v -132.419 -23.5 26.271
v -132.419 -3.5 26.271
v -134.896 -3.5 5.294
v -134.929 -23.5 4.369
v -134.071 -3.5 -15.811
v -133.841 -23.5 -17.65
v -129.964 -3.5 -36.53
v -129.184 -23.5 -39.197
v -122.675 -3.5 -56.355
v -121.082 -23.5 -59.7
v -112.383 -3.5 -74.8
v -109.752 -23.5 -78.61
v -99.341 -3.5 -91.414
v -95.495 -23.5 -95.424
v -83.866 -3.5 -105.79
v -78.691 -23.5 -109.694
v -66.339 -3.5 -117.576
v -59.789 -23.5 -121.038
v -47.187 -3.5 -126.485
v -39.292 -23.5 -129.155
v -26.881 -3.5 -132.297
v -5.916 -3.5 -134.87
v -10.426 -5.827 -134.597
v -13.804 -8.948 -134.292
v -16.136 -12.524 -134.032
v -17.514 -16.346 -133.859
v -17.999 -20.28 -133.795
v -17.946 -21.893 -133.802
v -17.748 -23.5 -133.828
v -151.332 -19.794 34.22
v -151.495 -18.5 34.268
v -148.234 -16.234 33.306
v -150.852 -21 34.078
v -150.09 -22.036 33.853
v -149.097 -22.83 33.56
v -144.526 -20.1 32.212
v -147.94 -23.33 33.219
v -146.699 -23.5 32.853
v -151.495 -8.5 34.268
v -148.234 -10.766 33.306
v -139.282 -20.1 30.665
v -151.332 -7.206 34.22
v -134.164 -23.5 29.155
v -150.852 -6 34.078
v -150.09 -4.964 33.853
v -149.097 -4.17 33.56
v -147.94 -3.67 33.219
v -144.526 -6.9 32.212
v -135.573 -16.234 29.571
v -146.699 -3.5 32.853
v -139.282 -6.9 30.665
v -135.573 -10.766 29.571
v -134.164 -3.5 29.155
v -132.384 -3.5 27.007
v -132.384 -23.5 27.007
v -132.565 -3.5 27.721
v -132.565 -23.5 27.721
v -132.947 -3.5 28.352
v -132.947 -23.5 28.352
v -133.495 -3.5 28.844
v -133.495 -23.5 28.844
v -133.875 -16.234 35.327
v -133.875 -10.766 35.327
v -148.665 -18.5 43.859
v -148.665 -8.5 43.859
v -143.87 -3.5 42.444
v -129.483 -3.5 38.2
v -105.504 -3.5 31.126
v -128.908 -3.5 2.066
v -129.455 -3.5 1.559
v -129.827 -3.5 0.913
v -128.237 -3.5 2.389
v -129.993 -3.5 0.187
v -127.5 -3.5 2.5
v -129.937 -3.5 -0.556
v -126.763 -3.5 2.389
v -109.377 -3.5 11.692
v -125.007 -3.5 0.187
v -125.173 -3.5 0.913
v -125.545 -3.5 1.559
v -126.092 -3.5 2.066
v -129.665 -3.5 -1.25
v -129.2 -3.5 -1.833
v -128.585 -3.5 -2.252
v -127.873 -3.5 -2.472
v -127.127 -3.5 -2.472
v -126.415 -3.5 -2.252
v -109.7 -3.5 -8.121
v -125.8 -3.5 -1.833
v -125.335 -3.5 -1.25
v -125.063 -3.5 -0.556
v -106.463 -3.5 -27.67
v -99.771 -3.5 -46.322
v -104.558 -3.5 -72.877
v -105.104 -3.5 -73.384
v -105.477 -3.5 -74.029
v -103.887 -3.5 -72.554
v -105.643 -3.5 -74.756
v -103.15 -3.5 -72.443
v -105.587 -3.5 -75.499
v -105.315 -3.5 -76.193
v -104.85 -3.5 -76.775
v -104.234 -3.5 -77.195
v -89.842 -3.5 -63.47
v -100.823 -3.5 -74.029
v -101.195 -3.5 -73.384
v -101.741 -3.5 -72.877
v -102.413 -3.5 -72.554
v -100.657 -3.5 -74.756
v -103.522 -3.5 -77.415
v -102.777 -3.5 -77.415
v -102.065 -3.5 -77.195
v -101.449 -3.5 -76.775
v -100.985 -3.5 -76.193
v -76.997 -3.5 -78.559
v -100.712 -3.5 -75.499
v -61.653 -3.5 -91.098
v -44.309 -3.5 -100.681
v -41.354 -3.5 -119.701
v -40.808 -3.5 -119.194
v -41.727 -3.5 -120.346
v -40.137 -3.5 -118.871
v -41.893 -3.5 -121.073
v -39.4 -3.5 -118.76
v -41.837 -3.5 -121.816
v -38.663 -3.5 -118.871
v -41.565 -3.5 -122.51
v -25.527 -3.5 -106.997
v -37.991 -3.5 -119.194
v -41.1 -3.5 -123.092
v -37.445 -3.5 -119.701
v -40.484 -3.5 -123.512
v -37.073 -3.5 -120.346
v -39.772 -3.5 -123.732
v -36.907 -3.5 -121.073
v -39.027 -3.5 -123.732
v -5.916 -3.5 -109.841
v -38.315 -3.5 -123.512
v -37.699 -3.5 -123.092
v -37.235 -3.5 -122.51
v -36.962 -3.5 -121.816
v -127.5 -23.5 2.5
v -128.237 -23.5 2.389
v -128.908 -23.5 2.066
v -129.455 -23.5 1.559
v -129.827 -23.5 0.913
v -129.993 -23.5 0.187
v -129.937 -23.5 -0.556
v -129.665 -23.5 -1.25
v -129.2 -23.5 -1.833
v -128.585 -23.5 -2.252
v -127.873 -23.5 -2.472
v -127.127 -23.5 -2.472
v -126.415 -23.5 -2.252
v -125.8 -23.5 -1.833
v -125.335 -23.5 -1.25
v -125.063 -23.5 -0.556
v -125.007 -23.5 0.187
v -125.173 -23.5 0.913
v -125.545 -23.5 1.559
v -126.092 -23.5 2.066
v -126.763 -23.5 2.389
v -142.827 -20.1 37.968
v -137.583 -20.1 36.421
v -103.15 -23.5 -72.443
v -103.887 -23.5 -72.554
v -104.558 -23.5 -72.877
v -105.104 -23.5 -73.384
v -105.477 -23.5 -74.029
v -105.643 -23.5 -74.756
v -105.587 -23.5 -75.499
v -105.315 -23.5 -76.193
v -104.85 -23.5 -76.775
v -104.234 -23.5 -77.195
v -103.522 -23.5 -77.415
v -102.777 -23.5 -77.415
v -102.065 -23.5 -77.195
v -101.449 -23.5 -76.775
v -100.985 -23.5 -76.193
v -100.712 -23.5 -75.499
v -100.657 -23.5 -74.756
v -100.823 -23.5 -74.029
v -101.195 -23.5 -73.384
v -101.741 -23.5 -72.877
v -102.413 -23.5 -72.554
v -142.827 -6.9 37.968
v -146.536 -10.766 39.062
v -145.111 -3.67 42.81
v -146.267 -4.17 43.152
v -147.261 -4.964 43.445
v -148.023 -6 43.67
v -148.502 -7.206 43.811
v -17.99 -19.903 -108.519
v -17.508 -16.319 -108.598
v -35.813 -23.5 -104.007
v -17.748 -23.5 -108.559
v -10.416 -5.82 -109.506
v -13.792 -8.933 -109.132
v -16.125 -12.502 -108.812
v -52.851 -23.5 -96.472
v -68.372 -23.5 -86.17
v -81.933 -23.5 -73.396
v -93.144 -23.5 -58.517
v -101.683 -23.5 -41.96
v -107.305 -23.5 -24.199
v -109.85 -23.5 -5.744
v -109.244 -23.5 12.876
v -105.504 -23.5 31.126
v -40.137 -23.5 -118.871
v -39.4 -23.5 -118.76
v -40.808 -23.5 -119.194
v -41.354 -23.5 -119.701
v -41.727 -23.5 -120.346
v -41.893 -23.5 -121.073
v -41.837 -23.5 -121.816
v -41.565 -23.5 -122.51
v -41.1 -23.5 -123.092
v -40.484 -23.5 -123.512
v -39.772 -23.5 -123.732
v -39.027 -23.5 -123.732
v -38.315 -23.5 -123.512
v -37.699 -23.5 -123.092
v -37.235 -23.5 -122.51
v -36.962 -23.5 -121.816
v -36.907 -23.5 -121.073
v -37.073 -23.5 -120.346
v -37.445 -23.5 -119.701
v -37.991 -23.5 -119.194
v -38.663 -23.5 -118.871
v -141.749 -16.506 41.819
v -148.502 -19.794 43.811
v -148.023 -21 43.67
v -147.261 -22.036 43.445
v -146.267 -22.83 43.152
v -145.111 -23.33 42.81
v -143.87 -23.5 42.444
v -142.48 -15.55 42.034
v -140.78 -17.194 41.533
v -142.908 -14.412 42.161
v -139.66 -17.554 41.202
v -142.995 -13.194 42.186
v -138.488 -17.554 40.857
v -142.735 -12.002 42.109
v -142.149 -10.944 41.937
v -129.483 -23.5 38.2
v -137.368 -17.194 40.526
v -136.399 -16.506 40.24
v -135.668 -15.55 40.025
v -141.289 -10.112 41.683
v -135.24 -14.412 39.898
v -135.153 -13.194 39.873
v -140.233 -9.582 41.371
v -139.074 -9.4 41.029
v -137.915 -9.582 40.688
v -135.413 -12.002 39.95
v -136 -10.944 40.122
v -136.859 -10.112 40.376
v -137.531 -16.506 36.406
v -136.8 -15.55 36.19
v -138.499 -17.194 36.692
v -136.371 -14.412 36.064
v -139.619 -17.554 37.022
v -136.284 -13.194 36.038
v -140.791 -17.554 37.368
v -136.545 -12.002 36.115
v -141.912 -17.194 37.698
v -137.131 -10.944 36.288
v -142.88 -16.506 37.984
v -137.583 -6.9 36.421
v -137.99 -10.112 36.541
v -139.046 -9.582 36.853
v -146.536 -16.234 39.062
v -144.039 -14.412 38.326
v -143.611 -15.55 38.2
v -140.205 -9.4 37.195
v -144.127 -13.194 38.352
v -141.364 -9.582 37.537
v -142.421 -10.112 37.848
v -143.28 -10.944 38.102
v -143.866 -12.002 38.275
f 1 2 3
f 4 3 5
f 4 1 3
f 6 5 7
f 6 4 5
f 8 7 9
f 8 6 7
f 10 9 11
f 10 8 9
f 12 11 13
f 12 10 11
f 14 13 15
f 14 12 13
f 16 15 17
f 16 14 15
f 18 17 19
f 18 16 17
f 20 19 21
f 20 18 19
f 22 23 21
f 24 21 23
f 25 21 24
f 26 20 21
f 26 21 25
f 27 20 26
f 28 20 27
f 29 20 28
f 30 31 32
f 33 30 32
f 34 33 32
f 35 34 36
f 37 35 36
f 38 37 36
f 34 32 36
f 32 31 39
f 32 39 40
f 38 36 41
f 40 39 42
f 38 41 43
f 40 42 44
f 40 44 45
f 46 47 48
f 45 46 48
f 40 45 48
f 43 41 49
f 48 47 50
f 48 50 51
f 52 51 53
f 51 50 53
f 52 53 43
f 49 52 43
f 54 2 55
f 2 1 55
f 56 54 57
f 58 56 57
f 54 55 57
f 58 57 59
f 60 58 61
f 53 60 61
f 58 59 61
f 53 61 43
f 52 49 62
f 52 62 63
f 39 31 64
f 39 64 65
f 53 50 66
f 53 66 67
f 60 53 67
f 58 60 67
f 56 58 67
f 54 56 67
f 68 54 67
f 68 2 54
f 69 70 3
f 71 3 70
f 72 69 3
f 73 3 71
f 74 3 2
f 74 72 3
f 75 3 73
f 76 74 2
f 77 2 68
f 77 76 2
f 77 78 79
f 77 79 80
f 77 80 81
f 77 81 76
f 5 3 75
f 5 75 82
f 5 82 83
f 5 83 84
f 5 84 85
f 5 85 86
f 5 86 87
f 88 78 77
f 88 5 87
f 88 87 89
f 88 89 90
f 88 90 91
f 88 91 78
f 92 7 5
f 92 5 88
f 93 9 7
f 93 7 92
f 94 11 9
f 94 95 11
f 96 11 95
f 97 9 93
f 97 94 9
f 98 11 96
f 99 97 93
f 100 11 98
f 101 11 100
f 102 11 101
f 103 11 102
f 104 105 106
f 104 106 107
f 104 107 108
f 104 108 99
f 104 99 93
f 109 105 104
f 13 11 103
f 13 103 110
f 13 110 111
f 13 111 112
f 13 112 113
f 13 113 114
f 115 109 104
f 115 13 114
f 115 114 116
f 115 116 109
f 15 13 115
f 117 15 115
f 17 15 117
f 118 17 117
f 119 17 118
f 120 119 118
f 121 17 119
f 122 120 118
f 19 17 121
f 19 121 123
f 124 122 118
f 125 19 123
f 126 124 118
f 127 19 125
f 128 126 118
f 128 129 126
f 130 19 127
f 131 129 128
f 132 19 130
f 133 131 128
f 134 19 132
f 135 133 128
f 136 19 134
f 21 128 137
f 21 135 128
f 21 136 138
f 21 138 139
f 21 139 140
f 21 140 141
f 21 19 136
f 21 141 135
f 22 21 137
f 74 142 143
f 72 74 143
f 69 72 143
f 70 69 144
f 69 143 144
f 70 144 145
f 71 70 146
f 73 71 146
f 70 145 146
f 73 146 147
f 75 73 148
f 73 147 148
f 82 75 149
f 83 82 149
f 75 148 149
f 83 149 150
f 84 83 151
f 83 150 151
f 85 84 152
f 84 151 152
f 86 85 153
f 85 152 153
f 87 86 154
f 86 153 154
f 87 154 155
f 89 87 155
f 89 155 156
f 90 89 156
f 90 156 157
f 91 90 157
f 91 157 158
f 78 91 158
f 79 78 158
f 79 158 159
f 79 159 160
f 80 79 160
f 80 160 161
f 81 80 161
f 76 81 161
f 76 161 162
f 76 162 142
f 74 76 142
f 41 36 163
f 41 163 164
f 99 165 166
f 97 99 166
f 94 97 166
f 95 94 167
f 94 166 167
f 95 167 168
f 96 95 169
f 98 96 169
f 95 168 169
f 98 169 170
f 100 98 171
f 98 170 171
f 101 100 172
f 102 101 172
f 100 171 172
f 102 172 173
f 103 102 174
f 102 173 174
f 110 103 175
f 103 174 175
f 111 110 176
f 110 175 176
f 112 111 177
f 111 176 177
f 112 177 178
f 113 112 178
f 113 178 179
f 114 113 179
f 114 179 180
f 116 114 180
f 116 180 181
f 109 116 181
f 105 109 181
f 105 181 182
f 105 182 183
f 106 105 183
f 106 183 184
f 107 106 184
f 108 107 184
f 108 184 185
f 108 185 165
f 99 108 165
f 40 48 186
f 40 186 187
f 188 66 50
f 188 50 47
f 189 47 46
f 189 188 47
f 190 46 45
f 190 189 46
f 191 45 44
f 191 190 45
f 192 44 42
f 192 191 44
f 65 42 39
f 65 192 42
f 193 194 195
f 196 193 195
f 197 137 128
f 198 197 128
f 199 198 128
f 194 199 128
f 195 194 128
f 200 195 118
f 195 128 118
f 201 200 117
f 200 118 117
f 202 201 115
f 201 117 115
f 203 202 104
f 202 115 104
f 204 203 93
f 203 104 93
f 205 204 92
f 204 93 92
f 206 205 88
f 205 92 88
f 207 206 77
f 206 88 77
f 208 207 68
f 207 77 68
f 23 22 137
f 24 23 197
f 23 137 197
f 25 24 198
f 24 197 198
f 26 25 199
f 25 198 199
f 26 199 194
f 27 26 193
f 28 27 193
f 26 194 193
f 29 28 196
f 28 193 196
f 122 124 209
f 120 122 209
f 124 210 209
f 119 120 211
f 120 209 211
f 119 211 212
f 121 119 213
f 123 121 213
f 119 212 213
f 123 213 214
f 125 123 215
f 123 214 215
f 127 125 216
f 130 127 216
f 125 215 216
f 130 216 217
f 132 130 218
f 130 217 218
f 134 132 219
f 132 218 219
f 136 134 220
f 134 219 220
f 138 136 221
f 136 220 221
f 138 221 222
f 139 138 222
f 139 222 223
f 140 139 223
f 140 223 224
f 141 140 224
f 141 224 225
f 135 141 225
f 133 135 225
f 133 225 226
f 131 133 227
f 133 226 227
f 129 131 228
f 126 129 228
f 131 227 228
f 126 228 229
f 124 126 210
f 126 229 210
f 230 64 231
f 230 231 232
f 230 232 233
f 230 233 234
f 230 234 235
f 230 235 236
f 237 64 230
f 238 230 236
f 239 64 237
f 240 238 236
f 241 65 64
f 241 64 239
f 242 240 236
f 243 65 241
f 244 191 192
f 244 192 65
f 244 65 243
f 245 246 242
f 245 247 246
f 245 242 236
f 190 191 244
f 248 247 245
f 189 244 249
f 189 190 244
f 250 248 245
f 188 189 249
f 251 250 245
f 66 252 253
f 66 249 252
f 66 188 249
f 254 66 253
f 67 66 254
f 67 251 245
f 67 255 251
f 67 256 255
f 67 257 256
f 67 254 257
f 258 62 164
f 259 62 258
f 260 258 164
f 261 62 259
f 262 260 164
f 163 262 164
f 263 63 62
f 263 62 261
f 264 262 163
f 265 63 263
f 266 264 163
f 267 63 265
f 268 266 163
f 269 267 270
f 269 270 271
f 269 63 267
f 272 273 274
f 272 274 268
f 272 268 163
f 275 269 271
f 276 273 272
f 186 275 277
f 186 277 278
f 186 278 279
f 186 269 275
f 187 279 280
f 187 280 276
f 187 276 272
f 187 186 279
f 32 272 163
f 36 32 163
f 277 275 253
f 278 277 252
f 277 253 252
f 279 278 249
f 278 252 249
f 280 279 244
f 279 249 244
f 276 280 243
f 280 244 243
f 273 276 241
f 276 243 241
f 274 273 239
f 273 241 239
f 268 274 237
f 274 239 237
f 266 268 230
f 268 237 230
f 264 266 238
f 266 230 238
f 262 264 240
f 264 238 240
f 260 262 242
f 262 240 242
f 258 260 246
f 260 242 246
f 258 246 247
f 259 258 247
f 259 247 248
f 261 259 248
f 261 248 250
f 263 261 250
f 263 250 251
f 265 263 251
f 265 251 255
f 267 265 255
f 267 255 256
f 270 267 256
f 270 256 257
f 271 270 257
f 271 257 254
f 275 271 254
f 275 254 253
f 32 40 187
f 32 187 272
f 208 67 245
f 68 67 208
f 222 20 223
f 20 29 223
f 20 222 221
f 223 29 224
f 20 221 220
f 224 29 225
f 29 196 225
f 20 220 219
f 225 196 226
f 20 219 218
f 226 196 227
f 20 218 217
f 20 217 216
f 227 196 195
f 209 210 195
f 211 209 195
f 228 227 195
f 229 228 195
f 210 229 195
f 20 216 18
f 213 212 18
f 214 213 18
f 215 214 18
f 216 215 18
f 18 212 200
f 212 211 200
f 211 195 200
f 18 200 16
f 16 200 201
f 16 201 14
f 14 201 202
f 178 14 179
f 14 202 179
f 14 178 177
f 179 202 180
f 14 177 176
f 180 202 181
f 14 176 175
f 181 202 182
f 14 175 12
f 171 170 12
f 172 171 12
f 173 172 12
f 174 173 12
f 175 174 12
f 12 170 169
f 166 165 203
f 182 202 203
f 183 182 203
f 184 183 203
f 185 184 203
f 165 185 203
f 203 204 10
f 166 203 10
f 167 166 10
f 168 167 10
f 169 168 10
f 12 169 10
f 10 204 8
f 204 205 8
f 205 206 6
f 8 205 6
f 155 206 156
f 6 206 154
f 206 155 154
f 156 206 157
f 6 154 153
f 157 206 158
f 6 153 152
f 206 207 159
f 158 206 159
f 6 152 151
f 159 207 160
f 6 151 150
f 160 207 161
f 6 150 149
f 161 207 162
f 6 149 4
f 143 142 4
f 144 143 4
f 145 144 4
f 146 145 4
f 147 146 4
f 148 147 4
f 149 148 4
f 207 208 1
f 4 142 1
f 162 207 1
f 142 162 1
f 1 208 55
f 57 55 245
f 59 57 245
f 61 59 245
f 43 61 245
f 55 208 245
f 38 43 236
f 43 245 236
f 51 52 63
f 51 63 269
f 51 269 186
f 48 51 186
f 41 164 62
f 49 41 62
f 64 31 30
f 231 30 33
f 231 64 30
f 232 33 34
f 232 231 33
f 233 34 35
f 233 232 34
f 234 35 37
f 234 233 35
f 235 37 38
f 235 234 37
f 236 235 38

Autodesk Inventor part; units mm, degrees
ref_plane "YZ Plane" through (0, 0, 0) normal (1, 0, 0) x (0, 1, 0)
ref_plane "XZ Plane" through (0, 0, 0) normal (0, 1, 0) x (-1, 0, 0)
ref_plane "XY Plane" through (0, 0, 0) normal (0, 0, 1) x (1, 0, 0)
sketch "Sketch1" plane through (0, 0, 0) normal (0, 1, 0) x (-1, 0, 0)
  circle A0 centre (0, 0) radius 135
  circle A1 centre (0, 0) radius 110
  dimension "d0" = 270
  dimension "d1" = 220
extrude "Extrusion1" add sketch "Sketch1" along normal mid plane 47
sketch "Sketch2" plane through (0, 0, 0) normal (0, 0, 1) x (1, 0, 0)
  circle A0 centre (0, -20.5) radius 18
  line L0 (-135, -23.5) -> (135, -23.5) projected
  dimension "d4" = 36
  dimension "d38" = 3
extrude "Extrusion2" cut sketch "Sketch2" against normal through all
sketch "Sketch3" plane through (0, 23.5, 0) normal (0, 1, 0) x (1, 0, 0)
  circle A0 centre (0, 0) radius 127.5
  circle A1 centre (-127.5, 0) radius 2
  circle A2 centre (-103.1497, -74.9426) radius 2
  circle A3 centre (-39.3997, -121.2597) radius 2
  circle A4 centre (39.3997, -121.2597) radius 2
  circle A5 centre (103.1497, -74.9426) radius 2
  circle A6 centre (127.5, 0) radius 2
  circle A7 centre (103.1497, 74.9426) radius 2
  circle A8 centre (39.3997, 121.2597) radius 2
  circle A9 centre (-39.3997, 121.2597) radius 2
  circle A10 centre (-103.1497, 74.9426) radius 2
  dimension "d7" = 255
  dimension "d8" = 4
  dimension "d11" = 360
hole "Hole1" at (39.3997, 23.5, 121.2597) at (-39.3997, 23.5, 121.2597) at (-103.1497, 23.5, 74.9426) at (-127.5, 23.5, 0) at (-103.1497, 23.5, -74.9426) at (-39.3997, 23.5, -121.2597) at (39.3997, 23.5, -121.2597) at (103.1497, 23.5, -74.9426) at (127.5, 23.5, 0) at (103.1497, 23.5, 74.9426) direction (0, -1, 0) diameter 5 end through all
sketch "Sketch4" plane through (0, 23.5, 0) normal (0, 1, 0) x (1, 0, 0)
  circle A0 centre (0, 0) radius 140
extrude "Extrusion3" cut sketch "Sketch4" against normal blind 27
sketch "Sketch7" plane through (0, -3.5, 0) normal (0, 1, 0) x (1, 0, 0)
  line L0 (0, 0) -> (70, 0)
  line L1 (80, -100) -> (60, -100)
  line L2 (60, -100) -> (60, 100)
  line L3 (60, 100) -> (80, 100)
  line L4 (80, 100) -> (80, -100)
  line L5 (80, -100) -> (60, 100) construction
  line L6 (60, -100) -> (80, 100) construction
  dimension "d39" = 70
  dimension "d40" = 20
  dimension "d41" = 200
extrude "Extrusion7" cut sketch "Sketch7" against normal blind 15
sketch "Sketch8" plane through (0, -3.5, 0) normal (0, 1, 0) x (1, 0, 0)
  line L0 (-129.4827, -38.1999) -> (129.4827, 38.1999)
  line L1 (0, 134.8703) -> (0, -135)
  arc A0 (-5.9161, 134.8703) -> (5.9161, 134.8703) centre (0, 0) ccw projected
  arc A1 (129.4827, 38.1999) -> (0, 135) centre (0, 0) ccw
extrude "Extrusion8" cut sketch "Sketch8" against normal through all
sketch "Sketch9" plane through (0, -3.5, 0) normal (0, 1, 0) x (1, 0, 0)
  line L0 (129.4827, 38.1999) -> (105.5044, 31.1258) projected
  arc A0 (105.5044, 31.1258) -> (17.7482, 108.5587) centre (0, 0) ccw projected
  line L1 (17.7482, 108.5587) -> (17.7482, 133.8282) projected
  arc A1 (129.4827, 38.1999) -> (17.7482, 133.8282) centre (0, 0) ccw projected
  circle A2 centre (39.3997, 121.2597) radius 2.5 projected
  circle A3 centre (103.1497, 74.9426) radius 2.5 projected
  line L2 (105.5044, 31.1258) -> (129.4827, 38.1999) projected
  arc A4 (129.4827, 38.1999) -> (5.9161, 134.8703) centre (0, 0) ccw projected
  line L3 (5.9161, 109.8408) -> (5.9161, 134.8703) projected
  arc A5 (60, 92.1954) -> (5.9161, 109.8408) centre (0, 0) ccw projected
  line L4 (60, 92.1954) -> (60, 100) projected
  line L5 (60, 100) -> (80, 100) projected
  line L6 (80, 100) -> (80, 75.4983) projected
  arc A6 (105.5044, 31.1258) -> (80, 75.4983) centre (0, 0) ccw projected
  circle A7 centre (103.1497, 74.9426) radius 2.5 projected
  circle A8 centre (39.3997, 121.2597) radius 2.5 projected
  point P0 (17.7482, 108.5587)
extrude "Extrusion9" cut sketch "Sketch9" against normal through all
sketch "Sketch10" plane through (-105.5044, -23.5, 31.1258) normal (0.2829619, 0, 0.9591312) x (0.9591312, 0, -0.2829619)
  line L0 (-25, 0) -> (130.8454, 0) projected
  line L1 (-22.5, 0) -> (-40, 0)
  line L2 (-45, 5) -> (-45, 15)
  line L3 (-40, 20) -> (-22.5, 20)
  line L4 (-22.5, 20) -> (-22.5, 0)
  line L5 (-25, 0) -> (-25, 20) projected
  arc A0 (-45, 5) -> (-40, 0) centre (-40, 5) ccw
  arc A1 (-40, 20) -> (-45, 15) centre (-40, 15) ccw
  point P0 (110, 23.5)
  point P1 (-45, 20)
  point P2 (-45, 0)
  point P3 (-25, 0)
  dimension "d48" = 22.5
  dimension "d49" = 20
  dimension "d50" = 20
  dimension "d51" = 5
extrude "Extrusion10" add sketch "Sketch10" against normal blind 10
fillet "Fillet1" radius 2.5 1 edges at (-131.9566, -13.5, 28.5036)
sketch "Sketch11" plane through (-108.334, -23.5, 21.5345) normal (-0.2829619, 0, -0.9591312) x (-0.9591312, 0, 0.2829619)
  line L0 (32.2662, 16.6) -> (37.7338, 16.6)
  line L1 (37.7338, 16.6) -> (41.6, 12.7338)
  line L2 (41.6, 12.7338) -> (41.6, 7.2662)
  line L3 (41.6, 7.2662) -> (37.7338, 3.4)
  line L4 (37.7338, 3.4) -> (32.2662, 3.4)
  line L5 (32.2662, 3.4) -> (28.4, 7.2662)
  line L6 (28.4, 7.2662) -> (28.4, 12.7338)
  line L7 (28.4, 12.7338) -> (32.2662, 16.6)
  line L8 (40, 20) -> (26.9306, 20) projected
  line L9 (45, 5) -> (45, 15) projected
  point P0 (-110, 23.5)
  point P1 (35, 10)
  dimension "d55" = 10
  dimension "d56" = 10
  dimension "d57" = 13.2
extrude "Extrusion11" cut sketch "Sketch11" against normal blind 6
sketch "Sketch12" plane through (-106.6363, -23.5, 27.2893) normal (-0.2829619, 0, -0.9591312) x (-0.9591312, 0, 0.2829619)
  line L0 (45, 5) -> (45, 15) projected
  line L1 (40, 20) -> (26.9306, 20) projected
  point P0 (-110, 23.5)
  point P1 (35, 10)
  dimension "d60" = 10
  dimension "d61" = 10
hole "Hole2" at (-140.2059, -13.5, 37.1929) direction (0.2829619, 0, 0.9591312) diameter 8.2 end through all
properties part number "Cylinder Spacer Bottom_Q"
